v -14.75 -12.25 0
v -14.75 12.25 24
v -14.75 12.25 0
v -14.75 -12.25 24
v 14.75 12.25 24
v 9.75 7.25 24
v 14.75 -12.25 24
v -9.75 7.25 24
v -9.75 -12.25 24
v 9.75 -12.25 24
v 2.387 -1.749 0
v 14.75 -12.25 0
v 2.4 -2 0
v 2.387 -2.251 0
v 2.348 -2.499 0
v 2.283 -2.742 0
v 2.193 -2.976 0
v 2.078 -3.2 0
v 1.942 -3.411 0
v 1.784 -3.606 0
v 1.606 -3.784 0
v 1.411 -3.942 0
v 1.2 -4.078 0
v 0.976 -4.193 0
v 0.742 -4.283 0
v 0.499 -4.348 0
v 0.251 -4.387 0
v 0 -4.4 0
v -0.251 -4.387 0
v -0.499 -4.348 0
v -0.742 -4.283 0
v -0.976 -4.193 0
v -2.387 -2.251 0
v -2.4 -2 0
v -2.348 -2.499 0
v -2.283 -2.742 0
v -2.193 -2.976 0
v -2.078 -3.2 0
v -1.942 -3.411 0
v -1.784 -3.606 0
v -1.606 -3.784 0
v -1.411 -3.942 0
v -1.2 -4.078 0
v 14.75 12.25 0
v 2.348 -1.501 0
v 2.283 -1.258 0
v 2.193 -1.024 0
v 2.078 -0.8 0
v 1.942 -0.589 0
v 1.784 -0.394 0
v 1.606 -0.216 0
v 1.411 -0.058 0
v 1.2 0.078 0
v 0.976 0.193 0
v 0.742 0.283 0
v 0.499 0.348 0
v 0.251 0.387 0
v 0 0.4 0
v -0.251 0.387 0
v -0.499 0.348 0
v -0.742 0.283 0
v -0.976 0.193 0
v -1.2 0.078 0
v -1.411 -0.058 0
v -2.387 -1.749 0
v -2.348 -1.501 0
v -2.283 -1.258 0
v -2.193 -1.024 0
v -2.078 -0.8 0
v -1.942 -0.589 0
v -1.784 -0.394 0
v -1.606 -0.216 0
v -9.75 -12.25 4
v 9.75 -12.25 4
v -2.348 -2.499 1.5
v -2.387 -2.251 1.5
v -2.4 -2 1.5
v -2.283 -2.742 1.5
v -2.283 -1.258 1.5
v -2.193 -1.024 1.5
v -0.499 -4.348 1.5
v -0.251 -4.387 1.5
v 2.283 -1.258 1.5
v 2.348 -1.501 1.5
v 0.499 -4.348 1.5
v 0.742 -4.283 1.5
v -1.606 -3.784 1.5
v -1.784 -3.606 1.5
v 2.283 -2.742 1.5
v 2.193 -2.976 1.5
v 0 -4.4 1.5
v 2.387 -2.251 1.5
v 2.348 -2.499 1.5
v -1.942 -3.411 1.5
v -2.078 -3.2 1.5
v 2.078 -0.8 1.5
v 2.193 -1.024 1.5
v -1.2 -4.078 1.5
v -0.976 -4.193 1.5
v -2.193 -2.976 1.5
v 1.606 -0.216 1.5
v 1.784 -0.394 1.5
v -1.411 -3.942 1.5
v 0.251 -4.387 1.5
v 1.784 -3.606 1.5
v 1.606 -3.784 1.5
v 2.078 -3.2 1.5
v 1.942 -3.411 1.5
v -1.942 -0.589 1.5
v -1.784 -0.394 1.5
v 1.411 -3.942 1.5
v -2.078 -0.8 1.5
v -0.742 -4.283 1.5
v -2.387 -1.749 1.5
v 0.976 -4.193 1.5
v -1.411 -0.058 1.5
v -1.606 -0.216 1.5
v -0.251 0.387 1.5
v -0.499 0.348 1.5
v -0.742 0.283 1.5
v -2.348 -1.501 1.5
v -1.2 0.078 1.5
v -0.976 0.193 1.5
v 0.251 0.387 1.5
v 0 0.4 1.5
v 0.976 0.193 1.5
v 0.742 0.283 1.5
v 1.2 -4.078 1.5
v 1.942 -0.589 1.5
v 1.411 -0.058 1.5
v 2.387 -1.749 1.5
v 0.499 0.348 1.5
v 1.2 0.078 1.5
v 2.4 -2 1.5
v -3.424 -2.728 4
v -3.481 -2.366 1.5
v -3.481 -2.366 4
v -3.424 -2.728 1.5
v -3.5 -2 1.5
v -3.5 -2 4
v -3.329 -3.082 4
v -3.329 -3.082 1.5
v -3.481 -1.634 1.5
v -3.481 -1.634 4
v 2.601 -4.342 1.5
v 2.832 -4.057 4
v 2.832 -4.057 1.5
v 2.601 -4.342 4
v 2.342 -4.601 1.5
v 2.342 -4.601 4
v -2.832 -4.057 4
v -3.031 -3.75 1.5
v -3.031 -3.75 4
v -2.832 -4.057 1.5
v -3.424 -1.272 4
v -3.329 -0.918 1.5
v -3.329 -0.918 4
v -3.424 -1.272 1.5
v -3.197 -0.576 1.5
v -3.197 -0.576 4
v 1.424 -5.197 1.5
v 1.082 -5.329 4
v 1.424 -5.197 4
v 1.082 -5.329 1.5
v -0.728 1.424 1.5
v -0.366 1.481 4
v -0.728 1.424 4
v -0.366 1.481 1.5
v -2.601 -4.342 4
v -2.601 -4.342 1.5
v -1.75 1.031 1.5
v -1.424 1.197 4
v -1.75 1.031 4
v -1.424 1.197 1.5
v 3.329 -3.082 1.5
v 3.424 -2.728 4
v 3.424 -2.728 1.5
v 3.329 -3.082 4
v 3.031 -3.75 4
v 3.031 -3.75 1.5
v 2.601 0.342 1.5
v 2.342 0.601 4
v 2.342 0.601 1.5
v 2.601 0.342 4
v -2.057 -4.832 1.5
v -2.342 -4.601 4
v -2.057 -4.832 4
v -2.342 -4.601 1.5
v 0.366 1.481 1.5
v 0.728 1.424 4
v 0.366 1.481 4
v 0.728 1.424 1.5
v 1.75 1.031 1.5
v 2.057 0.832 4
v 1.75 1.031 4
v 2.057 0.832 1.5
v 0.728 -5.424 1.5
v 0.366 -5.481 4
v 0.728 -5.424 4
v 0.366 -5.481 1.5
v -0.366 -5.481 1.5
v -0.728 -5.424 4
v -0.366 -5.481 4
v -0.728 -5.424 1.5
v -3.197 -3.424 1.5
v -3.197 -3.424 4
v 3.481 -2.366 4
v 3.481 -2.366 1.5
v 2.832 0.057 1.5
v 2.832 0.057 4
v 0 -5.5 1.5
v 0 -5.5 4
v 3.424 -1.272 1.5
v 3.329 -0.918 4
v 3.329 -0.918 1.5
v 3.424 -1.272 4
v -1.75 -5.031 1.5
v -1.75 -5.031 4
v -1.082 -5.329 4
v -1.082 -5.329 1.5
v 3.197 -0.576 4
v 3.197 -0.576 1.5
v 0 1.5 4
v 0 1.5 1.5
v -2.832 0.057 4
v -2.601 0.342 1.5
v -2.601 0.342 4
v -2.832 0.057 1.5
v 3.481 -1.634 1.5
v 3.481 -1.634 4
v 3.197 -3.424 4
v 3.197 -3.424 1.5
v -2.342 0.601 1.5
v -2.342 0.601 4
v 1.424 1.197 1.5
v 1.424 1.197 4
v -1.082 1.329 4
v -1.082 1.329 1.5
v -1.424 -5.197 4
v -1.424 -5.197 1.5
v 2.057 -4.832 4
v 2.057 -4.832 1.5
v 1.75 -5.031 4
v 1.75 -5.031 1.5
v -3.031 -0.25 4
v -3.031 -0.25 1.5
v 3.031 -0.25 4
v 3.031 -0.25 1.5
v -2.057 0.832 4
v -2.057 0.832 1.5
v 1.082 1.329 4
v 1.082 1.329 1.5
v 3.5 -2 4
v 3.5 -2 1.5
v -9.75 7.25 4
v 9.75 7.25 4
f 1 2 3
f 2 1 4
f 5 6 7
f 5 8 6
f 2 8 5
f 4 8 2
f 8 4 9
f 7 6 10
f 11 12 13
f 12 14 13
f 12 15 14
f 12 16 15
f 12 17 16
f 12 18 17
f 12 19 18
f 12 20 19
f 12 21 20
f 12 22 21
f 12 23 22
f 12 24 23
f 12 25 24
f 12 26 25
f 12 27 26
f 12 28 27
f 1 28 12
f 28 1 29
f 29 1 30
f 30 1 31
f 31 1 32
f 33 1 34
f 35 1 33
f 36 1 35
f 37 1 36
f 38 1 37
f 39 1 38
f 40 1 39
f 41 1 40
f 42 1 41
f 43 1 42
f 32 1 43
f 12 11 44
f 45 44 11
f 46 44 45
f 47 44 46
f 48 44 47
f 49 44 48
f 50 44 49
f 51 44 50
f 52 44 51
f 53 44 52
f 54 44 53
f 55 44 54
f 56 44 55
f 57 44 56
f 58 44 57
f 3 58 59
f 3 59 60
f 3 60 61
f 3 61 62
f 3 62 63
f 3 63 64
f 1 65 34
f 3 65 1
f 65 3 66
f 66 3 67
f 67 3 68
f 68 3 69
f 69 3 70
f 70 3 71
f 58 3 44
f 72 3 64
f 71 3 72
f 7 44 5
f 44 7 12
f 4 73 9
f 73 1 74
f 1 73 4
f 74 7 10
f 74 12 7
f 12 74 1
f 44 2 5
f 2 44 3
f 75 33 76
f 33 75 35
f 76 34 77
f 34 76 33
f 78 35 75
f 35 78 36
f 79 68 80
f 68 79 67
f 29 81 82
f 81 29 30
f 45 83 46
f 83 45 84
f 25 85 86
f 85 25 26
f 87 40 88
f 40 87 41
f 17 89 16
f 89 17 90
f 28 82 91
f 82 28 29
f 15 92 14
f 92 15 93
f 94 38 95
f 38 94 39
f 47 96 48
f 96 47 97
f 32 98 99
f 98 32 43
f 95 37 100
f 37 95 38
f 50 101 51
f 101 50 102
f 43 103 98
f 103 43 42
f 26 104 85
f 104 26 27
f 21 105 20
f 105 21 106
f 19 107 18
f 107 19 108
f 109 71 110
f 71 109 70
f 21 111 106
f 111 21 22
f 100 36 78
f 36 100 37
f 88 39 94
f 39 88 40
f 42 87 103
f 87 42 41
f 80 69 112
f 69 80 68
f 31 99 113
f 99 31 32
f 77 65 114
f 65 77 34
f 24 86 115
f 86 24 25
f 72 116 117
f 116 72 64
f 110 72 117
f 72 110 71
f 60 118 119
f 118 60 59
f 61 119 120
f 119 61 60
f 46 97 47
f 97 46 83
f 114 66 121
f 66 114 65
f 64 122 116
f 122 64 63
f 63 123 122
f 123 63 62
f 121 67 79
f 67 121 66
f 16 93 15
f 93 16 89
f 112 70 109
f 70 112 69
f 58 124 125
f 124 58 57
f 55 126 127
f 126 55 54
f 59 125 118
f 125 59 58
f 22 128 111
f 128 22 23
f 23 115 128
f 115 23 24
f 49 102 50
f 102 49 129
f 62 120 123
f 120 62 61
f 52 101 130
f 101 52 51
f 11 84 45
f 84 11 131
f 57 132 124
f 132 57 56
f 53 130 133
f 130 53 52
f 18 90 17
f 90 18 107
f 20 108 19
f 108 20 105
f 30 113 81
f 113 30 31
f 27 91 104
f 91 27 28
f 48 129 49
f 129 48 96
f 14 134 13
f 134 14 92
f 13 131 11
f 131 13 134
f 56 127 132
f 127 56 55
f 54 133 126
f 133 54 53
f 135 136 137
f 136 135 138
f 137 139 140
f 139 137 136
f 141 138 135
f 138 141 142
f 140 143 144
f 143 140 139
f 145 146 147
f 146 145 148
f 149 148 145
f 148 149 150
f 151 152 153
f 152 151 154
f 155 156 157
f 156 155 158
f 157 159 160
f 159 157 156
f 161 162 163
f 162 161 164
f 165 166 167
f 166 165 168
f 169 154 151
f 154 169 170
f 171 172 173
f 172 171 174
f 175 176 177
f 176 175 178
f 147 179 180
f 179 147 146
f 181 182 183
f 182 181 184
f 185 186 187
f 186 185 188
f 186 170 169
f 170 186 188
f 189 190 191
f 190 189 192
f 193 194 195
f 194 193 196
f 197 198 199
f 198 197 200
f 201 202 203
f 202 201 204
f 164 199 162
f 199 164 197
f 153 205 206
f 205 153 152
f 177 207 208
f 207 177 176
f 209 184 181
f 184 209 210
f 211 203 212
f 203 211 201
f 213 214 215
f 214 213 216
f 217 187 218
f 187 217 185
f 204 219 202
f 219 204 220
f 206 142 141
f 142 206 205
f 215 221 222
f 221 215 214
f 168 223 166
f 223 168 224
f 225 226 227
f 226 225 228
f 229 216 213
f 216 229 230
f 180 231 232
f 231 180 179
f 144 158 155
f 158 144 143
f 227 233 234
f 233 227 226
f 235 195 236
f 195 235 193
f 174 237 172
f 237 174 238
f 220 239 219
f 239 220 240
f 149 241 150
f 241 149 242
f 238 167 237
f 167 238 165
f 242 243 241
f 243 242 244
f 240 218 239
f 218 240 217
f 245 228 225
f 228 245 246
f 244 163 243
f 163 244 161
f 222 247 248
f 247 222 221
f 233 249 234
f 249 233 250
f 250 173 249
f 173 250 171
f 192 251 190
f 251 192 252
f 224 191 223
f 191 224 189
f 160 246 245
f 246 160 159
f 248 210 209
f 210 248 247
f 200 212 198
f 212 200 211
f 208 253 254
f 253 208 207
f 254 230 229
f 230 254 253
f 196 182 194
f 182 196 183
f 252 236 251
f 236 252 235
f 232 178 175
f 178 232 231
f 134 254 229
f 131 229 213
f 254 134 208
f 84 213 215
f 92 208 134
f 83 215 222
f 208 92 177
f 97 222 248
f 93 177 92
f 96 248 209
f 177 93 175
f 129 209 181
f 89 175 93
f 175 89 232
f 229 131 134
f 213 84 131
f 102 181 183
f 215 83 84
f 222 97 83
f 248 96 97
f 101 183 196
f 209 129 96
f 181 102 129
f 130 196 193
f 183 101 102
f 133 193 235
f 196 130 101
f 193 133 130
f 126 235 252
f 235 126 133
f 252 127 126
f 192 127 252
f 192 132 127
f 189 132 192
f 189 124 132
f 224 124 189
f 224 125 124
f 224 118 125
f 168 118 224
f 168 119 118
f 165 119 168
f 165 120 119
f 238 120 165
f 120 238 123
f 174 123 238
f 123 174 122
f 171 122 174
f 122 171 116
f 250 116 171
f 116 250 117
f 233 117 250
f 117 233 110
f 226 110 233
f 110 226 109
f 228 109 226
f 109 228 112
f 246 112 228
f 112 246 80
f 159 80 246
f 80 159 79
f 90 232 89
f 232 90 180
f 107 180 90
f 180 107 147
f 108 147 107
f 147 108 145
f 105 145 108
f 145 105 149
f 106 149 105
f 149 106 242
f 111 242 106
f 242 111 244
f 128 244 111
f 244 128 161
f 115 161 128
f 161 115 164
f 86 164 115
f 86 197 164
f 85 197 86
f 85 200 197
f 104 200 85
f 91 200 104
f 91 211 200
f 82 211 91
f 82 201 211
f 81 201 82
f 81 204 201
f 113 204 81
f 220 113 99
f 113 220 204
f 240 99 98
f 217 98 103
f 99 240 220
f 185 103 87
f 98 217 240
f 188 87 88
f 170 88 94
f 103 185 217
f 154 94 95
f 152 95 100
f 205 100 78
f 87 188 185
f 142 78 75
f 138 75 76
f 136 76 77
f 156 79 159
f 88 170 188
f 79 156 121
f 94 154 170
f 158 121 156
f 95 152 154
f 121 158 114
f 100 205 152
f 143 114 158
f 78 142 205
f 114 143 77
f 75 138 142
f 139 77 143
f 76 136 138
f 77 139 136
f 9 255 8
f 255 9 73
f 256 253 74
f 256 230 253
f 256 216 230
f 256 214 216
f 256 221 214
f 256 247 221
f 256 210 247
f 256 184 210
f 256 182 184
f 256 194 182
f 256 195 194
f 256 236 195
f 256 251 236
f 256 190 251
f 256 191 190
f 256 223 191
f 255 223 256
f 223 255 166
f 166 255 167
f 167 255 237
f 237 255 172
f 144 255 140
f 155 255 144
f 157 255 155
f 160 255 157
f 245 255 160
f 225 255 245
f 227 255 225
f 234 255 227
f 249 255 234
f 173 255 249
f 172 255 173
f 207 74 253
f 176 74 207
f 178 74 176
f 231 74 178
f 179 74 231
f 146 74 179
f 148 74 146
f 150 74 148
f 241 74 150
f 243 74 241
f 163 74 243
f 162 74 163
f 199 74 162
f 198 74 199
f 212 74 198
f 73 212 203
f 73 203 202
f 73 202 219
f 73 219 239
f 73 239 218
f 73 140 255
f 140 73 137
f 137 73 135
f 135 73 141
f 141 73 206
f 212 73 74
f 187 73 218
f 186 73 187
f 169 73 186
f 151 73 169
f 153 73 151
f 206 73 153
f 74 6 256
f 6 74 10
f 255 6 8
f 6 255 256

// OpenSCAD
//Square Rod or Tubing Bracket
//Designed by Bryscus: Bryce B.

//Number of Holes
Num_Holes=1; //[1:2]

//Extension Distance
ED=20;

//Tubing Width
TW=19.5;

//Tubing Slot Wall Thickness
WT=5;

//Screw Hole Radius
SHR=2.4;

//(1 Hole) Screw Head Size (radius)
SHS=3.5;

//(1 Hole) Screw Head Depth
SHD=2.5;

//(2 Holes) Screw Bracket Oversizing
SBO=0;

//(2 Holes) Screw Bracket Tab Length
TL=20;

//(2 Holes) Screw Distance
SD=9;

//Mount Thickness
MT=4;

//(2 Holes) Screw Bracket Fillet Radius
FR=5;

if(Num_Holes == 1)
{
rotate([0,0,180])
difference(){
translate([0,0,ED/2+MT/2])
	cube([TW+(WT*2), TW+WT, ED+MT],center=true);
translate([0,MT/2,MT/2])
	cylinder(h=MT+5, r=SHR,$fn=60,center=true); // screw hole
translate([0,MT/2,MT-SHD])
	cylinder(h=SHD+1, r=SHS,$fn=60); // screw head hole
translate([0,WT,(ED+5)/2+MT])
	cube([TW,TW+WT,ED+5],center=true);
}
}

if(Num_Holes == 2)
{
rotate([0,0,180])
difference(){
union(){
	translate([-(TW+(WT*2)+SBO*2-FR*2)/2,-(TW+WT*2+(TL-FR)*2)/2,0]) 
	minkowski(){
		cube([TW+(WT*2)+SBO*2-FR*2,TW+WT*2+(TL-FR)*2,MT/2]); // Screw Bracket
		cylinder(r=FR, h=MT/2,$fn=60);
	}
	translate([0,0,ED/2+MT])
		cube([TW+(WT*2), TW+WT*2, ED],center=true); //Tube Holder Outside
}
translate([0,TL/2+WT+TW/2,MT/2])  //TW+SD
	cylinder(h=MT+5, r=SHR,$fn=60,center=true); //screw hole
translate([0,-(TL/2+WT+TW/2),MT/2])  //-(TL/2+TW/4+WT/2)
	cylinder(h=MT+5, r=SHR,$fn=60,center=true); // screw hole
translate([0,WT,(ED+5)/2+MT])
	cube([TW,TW+WT*2,ED+5],center=true); //tubing opening
}
}
